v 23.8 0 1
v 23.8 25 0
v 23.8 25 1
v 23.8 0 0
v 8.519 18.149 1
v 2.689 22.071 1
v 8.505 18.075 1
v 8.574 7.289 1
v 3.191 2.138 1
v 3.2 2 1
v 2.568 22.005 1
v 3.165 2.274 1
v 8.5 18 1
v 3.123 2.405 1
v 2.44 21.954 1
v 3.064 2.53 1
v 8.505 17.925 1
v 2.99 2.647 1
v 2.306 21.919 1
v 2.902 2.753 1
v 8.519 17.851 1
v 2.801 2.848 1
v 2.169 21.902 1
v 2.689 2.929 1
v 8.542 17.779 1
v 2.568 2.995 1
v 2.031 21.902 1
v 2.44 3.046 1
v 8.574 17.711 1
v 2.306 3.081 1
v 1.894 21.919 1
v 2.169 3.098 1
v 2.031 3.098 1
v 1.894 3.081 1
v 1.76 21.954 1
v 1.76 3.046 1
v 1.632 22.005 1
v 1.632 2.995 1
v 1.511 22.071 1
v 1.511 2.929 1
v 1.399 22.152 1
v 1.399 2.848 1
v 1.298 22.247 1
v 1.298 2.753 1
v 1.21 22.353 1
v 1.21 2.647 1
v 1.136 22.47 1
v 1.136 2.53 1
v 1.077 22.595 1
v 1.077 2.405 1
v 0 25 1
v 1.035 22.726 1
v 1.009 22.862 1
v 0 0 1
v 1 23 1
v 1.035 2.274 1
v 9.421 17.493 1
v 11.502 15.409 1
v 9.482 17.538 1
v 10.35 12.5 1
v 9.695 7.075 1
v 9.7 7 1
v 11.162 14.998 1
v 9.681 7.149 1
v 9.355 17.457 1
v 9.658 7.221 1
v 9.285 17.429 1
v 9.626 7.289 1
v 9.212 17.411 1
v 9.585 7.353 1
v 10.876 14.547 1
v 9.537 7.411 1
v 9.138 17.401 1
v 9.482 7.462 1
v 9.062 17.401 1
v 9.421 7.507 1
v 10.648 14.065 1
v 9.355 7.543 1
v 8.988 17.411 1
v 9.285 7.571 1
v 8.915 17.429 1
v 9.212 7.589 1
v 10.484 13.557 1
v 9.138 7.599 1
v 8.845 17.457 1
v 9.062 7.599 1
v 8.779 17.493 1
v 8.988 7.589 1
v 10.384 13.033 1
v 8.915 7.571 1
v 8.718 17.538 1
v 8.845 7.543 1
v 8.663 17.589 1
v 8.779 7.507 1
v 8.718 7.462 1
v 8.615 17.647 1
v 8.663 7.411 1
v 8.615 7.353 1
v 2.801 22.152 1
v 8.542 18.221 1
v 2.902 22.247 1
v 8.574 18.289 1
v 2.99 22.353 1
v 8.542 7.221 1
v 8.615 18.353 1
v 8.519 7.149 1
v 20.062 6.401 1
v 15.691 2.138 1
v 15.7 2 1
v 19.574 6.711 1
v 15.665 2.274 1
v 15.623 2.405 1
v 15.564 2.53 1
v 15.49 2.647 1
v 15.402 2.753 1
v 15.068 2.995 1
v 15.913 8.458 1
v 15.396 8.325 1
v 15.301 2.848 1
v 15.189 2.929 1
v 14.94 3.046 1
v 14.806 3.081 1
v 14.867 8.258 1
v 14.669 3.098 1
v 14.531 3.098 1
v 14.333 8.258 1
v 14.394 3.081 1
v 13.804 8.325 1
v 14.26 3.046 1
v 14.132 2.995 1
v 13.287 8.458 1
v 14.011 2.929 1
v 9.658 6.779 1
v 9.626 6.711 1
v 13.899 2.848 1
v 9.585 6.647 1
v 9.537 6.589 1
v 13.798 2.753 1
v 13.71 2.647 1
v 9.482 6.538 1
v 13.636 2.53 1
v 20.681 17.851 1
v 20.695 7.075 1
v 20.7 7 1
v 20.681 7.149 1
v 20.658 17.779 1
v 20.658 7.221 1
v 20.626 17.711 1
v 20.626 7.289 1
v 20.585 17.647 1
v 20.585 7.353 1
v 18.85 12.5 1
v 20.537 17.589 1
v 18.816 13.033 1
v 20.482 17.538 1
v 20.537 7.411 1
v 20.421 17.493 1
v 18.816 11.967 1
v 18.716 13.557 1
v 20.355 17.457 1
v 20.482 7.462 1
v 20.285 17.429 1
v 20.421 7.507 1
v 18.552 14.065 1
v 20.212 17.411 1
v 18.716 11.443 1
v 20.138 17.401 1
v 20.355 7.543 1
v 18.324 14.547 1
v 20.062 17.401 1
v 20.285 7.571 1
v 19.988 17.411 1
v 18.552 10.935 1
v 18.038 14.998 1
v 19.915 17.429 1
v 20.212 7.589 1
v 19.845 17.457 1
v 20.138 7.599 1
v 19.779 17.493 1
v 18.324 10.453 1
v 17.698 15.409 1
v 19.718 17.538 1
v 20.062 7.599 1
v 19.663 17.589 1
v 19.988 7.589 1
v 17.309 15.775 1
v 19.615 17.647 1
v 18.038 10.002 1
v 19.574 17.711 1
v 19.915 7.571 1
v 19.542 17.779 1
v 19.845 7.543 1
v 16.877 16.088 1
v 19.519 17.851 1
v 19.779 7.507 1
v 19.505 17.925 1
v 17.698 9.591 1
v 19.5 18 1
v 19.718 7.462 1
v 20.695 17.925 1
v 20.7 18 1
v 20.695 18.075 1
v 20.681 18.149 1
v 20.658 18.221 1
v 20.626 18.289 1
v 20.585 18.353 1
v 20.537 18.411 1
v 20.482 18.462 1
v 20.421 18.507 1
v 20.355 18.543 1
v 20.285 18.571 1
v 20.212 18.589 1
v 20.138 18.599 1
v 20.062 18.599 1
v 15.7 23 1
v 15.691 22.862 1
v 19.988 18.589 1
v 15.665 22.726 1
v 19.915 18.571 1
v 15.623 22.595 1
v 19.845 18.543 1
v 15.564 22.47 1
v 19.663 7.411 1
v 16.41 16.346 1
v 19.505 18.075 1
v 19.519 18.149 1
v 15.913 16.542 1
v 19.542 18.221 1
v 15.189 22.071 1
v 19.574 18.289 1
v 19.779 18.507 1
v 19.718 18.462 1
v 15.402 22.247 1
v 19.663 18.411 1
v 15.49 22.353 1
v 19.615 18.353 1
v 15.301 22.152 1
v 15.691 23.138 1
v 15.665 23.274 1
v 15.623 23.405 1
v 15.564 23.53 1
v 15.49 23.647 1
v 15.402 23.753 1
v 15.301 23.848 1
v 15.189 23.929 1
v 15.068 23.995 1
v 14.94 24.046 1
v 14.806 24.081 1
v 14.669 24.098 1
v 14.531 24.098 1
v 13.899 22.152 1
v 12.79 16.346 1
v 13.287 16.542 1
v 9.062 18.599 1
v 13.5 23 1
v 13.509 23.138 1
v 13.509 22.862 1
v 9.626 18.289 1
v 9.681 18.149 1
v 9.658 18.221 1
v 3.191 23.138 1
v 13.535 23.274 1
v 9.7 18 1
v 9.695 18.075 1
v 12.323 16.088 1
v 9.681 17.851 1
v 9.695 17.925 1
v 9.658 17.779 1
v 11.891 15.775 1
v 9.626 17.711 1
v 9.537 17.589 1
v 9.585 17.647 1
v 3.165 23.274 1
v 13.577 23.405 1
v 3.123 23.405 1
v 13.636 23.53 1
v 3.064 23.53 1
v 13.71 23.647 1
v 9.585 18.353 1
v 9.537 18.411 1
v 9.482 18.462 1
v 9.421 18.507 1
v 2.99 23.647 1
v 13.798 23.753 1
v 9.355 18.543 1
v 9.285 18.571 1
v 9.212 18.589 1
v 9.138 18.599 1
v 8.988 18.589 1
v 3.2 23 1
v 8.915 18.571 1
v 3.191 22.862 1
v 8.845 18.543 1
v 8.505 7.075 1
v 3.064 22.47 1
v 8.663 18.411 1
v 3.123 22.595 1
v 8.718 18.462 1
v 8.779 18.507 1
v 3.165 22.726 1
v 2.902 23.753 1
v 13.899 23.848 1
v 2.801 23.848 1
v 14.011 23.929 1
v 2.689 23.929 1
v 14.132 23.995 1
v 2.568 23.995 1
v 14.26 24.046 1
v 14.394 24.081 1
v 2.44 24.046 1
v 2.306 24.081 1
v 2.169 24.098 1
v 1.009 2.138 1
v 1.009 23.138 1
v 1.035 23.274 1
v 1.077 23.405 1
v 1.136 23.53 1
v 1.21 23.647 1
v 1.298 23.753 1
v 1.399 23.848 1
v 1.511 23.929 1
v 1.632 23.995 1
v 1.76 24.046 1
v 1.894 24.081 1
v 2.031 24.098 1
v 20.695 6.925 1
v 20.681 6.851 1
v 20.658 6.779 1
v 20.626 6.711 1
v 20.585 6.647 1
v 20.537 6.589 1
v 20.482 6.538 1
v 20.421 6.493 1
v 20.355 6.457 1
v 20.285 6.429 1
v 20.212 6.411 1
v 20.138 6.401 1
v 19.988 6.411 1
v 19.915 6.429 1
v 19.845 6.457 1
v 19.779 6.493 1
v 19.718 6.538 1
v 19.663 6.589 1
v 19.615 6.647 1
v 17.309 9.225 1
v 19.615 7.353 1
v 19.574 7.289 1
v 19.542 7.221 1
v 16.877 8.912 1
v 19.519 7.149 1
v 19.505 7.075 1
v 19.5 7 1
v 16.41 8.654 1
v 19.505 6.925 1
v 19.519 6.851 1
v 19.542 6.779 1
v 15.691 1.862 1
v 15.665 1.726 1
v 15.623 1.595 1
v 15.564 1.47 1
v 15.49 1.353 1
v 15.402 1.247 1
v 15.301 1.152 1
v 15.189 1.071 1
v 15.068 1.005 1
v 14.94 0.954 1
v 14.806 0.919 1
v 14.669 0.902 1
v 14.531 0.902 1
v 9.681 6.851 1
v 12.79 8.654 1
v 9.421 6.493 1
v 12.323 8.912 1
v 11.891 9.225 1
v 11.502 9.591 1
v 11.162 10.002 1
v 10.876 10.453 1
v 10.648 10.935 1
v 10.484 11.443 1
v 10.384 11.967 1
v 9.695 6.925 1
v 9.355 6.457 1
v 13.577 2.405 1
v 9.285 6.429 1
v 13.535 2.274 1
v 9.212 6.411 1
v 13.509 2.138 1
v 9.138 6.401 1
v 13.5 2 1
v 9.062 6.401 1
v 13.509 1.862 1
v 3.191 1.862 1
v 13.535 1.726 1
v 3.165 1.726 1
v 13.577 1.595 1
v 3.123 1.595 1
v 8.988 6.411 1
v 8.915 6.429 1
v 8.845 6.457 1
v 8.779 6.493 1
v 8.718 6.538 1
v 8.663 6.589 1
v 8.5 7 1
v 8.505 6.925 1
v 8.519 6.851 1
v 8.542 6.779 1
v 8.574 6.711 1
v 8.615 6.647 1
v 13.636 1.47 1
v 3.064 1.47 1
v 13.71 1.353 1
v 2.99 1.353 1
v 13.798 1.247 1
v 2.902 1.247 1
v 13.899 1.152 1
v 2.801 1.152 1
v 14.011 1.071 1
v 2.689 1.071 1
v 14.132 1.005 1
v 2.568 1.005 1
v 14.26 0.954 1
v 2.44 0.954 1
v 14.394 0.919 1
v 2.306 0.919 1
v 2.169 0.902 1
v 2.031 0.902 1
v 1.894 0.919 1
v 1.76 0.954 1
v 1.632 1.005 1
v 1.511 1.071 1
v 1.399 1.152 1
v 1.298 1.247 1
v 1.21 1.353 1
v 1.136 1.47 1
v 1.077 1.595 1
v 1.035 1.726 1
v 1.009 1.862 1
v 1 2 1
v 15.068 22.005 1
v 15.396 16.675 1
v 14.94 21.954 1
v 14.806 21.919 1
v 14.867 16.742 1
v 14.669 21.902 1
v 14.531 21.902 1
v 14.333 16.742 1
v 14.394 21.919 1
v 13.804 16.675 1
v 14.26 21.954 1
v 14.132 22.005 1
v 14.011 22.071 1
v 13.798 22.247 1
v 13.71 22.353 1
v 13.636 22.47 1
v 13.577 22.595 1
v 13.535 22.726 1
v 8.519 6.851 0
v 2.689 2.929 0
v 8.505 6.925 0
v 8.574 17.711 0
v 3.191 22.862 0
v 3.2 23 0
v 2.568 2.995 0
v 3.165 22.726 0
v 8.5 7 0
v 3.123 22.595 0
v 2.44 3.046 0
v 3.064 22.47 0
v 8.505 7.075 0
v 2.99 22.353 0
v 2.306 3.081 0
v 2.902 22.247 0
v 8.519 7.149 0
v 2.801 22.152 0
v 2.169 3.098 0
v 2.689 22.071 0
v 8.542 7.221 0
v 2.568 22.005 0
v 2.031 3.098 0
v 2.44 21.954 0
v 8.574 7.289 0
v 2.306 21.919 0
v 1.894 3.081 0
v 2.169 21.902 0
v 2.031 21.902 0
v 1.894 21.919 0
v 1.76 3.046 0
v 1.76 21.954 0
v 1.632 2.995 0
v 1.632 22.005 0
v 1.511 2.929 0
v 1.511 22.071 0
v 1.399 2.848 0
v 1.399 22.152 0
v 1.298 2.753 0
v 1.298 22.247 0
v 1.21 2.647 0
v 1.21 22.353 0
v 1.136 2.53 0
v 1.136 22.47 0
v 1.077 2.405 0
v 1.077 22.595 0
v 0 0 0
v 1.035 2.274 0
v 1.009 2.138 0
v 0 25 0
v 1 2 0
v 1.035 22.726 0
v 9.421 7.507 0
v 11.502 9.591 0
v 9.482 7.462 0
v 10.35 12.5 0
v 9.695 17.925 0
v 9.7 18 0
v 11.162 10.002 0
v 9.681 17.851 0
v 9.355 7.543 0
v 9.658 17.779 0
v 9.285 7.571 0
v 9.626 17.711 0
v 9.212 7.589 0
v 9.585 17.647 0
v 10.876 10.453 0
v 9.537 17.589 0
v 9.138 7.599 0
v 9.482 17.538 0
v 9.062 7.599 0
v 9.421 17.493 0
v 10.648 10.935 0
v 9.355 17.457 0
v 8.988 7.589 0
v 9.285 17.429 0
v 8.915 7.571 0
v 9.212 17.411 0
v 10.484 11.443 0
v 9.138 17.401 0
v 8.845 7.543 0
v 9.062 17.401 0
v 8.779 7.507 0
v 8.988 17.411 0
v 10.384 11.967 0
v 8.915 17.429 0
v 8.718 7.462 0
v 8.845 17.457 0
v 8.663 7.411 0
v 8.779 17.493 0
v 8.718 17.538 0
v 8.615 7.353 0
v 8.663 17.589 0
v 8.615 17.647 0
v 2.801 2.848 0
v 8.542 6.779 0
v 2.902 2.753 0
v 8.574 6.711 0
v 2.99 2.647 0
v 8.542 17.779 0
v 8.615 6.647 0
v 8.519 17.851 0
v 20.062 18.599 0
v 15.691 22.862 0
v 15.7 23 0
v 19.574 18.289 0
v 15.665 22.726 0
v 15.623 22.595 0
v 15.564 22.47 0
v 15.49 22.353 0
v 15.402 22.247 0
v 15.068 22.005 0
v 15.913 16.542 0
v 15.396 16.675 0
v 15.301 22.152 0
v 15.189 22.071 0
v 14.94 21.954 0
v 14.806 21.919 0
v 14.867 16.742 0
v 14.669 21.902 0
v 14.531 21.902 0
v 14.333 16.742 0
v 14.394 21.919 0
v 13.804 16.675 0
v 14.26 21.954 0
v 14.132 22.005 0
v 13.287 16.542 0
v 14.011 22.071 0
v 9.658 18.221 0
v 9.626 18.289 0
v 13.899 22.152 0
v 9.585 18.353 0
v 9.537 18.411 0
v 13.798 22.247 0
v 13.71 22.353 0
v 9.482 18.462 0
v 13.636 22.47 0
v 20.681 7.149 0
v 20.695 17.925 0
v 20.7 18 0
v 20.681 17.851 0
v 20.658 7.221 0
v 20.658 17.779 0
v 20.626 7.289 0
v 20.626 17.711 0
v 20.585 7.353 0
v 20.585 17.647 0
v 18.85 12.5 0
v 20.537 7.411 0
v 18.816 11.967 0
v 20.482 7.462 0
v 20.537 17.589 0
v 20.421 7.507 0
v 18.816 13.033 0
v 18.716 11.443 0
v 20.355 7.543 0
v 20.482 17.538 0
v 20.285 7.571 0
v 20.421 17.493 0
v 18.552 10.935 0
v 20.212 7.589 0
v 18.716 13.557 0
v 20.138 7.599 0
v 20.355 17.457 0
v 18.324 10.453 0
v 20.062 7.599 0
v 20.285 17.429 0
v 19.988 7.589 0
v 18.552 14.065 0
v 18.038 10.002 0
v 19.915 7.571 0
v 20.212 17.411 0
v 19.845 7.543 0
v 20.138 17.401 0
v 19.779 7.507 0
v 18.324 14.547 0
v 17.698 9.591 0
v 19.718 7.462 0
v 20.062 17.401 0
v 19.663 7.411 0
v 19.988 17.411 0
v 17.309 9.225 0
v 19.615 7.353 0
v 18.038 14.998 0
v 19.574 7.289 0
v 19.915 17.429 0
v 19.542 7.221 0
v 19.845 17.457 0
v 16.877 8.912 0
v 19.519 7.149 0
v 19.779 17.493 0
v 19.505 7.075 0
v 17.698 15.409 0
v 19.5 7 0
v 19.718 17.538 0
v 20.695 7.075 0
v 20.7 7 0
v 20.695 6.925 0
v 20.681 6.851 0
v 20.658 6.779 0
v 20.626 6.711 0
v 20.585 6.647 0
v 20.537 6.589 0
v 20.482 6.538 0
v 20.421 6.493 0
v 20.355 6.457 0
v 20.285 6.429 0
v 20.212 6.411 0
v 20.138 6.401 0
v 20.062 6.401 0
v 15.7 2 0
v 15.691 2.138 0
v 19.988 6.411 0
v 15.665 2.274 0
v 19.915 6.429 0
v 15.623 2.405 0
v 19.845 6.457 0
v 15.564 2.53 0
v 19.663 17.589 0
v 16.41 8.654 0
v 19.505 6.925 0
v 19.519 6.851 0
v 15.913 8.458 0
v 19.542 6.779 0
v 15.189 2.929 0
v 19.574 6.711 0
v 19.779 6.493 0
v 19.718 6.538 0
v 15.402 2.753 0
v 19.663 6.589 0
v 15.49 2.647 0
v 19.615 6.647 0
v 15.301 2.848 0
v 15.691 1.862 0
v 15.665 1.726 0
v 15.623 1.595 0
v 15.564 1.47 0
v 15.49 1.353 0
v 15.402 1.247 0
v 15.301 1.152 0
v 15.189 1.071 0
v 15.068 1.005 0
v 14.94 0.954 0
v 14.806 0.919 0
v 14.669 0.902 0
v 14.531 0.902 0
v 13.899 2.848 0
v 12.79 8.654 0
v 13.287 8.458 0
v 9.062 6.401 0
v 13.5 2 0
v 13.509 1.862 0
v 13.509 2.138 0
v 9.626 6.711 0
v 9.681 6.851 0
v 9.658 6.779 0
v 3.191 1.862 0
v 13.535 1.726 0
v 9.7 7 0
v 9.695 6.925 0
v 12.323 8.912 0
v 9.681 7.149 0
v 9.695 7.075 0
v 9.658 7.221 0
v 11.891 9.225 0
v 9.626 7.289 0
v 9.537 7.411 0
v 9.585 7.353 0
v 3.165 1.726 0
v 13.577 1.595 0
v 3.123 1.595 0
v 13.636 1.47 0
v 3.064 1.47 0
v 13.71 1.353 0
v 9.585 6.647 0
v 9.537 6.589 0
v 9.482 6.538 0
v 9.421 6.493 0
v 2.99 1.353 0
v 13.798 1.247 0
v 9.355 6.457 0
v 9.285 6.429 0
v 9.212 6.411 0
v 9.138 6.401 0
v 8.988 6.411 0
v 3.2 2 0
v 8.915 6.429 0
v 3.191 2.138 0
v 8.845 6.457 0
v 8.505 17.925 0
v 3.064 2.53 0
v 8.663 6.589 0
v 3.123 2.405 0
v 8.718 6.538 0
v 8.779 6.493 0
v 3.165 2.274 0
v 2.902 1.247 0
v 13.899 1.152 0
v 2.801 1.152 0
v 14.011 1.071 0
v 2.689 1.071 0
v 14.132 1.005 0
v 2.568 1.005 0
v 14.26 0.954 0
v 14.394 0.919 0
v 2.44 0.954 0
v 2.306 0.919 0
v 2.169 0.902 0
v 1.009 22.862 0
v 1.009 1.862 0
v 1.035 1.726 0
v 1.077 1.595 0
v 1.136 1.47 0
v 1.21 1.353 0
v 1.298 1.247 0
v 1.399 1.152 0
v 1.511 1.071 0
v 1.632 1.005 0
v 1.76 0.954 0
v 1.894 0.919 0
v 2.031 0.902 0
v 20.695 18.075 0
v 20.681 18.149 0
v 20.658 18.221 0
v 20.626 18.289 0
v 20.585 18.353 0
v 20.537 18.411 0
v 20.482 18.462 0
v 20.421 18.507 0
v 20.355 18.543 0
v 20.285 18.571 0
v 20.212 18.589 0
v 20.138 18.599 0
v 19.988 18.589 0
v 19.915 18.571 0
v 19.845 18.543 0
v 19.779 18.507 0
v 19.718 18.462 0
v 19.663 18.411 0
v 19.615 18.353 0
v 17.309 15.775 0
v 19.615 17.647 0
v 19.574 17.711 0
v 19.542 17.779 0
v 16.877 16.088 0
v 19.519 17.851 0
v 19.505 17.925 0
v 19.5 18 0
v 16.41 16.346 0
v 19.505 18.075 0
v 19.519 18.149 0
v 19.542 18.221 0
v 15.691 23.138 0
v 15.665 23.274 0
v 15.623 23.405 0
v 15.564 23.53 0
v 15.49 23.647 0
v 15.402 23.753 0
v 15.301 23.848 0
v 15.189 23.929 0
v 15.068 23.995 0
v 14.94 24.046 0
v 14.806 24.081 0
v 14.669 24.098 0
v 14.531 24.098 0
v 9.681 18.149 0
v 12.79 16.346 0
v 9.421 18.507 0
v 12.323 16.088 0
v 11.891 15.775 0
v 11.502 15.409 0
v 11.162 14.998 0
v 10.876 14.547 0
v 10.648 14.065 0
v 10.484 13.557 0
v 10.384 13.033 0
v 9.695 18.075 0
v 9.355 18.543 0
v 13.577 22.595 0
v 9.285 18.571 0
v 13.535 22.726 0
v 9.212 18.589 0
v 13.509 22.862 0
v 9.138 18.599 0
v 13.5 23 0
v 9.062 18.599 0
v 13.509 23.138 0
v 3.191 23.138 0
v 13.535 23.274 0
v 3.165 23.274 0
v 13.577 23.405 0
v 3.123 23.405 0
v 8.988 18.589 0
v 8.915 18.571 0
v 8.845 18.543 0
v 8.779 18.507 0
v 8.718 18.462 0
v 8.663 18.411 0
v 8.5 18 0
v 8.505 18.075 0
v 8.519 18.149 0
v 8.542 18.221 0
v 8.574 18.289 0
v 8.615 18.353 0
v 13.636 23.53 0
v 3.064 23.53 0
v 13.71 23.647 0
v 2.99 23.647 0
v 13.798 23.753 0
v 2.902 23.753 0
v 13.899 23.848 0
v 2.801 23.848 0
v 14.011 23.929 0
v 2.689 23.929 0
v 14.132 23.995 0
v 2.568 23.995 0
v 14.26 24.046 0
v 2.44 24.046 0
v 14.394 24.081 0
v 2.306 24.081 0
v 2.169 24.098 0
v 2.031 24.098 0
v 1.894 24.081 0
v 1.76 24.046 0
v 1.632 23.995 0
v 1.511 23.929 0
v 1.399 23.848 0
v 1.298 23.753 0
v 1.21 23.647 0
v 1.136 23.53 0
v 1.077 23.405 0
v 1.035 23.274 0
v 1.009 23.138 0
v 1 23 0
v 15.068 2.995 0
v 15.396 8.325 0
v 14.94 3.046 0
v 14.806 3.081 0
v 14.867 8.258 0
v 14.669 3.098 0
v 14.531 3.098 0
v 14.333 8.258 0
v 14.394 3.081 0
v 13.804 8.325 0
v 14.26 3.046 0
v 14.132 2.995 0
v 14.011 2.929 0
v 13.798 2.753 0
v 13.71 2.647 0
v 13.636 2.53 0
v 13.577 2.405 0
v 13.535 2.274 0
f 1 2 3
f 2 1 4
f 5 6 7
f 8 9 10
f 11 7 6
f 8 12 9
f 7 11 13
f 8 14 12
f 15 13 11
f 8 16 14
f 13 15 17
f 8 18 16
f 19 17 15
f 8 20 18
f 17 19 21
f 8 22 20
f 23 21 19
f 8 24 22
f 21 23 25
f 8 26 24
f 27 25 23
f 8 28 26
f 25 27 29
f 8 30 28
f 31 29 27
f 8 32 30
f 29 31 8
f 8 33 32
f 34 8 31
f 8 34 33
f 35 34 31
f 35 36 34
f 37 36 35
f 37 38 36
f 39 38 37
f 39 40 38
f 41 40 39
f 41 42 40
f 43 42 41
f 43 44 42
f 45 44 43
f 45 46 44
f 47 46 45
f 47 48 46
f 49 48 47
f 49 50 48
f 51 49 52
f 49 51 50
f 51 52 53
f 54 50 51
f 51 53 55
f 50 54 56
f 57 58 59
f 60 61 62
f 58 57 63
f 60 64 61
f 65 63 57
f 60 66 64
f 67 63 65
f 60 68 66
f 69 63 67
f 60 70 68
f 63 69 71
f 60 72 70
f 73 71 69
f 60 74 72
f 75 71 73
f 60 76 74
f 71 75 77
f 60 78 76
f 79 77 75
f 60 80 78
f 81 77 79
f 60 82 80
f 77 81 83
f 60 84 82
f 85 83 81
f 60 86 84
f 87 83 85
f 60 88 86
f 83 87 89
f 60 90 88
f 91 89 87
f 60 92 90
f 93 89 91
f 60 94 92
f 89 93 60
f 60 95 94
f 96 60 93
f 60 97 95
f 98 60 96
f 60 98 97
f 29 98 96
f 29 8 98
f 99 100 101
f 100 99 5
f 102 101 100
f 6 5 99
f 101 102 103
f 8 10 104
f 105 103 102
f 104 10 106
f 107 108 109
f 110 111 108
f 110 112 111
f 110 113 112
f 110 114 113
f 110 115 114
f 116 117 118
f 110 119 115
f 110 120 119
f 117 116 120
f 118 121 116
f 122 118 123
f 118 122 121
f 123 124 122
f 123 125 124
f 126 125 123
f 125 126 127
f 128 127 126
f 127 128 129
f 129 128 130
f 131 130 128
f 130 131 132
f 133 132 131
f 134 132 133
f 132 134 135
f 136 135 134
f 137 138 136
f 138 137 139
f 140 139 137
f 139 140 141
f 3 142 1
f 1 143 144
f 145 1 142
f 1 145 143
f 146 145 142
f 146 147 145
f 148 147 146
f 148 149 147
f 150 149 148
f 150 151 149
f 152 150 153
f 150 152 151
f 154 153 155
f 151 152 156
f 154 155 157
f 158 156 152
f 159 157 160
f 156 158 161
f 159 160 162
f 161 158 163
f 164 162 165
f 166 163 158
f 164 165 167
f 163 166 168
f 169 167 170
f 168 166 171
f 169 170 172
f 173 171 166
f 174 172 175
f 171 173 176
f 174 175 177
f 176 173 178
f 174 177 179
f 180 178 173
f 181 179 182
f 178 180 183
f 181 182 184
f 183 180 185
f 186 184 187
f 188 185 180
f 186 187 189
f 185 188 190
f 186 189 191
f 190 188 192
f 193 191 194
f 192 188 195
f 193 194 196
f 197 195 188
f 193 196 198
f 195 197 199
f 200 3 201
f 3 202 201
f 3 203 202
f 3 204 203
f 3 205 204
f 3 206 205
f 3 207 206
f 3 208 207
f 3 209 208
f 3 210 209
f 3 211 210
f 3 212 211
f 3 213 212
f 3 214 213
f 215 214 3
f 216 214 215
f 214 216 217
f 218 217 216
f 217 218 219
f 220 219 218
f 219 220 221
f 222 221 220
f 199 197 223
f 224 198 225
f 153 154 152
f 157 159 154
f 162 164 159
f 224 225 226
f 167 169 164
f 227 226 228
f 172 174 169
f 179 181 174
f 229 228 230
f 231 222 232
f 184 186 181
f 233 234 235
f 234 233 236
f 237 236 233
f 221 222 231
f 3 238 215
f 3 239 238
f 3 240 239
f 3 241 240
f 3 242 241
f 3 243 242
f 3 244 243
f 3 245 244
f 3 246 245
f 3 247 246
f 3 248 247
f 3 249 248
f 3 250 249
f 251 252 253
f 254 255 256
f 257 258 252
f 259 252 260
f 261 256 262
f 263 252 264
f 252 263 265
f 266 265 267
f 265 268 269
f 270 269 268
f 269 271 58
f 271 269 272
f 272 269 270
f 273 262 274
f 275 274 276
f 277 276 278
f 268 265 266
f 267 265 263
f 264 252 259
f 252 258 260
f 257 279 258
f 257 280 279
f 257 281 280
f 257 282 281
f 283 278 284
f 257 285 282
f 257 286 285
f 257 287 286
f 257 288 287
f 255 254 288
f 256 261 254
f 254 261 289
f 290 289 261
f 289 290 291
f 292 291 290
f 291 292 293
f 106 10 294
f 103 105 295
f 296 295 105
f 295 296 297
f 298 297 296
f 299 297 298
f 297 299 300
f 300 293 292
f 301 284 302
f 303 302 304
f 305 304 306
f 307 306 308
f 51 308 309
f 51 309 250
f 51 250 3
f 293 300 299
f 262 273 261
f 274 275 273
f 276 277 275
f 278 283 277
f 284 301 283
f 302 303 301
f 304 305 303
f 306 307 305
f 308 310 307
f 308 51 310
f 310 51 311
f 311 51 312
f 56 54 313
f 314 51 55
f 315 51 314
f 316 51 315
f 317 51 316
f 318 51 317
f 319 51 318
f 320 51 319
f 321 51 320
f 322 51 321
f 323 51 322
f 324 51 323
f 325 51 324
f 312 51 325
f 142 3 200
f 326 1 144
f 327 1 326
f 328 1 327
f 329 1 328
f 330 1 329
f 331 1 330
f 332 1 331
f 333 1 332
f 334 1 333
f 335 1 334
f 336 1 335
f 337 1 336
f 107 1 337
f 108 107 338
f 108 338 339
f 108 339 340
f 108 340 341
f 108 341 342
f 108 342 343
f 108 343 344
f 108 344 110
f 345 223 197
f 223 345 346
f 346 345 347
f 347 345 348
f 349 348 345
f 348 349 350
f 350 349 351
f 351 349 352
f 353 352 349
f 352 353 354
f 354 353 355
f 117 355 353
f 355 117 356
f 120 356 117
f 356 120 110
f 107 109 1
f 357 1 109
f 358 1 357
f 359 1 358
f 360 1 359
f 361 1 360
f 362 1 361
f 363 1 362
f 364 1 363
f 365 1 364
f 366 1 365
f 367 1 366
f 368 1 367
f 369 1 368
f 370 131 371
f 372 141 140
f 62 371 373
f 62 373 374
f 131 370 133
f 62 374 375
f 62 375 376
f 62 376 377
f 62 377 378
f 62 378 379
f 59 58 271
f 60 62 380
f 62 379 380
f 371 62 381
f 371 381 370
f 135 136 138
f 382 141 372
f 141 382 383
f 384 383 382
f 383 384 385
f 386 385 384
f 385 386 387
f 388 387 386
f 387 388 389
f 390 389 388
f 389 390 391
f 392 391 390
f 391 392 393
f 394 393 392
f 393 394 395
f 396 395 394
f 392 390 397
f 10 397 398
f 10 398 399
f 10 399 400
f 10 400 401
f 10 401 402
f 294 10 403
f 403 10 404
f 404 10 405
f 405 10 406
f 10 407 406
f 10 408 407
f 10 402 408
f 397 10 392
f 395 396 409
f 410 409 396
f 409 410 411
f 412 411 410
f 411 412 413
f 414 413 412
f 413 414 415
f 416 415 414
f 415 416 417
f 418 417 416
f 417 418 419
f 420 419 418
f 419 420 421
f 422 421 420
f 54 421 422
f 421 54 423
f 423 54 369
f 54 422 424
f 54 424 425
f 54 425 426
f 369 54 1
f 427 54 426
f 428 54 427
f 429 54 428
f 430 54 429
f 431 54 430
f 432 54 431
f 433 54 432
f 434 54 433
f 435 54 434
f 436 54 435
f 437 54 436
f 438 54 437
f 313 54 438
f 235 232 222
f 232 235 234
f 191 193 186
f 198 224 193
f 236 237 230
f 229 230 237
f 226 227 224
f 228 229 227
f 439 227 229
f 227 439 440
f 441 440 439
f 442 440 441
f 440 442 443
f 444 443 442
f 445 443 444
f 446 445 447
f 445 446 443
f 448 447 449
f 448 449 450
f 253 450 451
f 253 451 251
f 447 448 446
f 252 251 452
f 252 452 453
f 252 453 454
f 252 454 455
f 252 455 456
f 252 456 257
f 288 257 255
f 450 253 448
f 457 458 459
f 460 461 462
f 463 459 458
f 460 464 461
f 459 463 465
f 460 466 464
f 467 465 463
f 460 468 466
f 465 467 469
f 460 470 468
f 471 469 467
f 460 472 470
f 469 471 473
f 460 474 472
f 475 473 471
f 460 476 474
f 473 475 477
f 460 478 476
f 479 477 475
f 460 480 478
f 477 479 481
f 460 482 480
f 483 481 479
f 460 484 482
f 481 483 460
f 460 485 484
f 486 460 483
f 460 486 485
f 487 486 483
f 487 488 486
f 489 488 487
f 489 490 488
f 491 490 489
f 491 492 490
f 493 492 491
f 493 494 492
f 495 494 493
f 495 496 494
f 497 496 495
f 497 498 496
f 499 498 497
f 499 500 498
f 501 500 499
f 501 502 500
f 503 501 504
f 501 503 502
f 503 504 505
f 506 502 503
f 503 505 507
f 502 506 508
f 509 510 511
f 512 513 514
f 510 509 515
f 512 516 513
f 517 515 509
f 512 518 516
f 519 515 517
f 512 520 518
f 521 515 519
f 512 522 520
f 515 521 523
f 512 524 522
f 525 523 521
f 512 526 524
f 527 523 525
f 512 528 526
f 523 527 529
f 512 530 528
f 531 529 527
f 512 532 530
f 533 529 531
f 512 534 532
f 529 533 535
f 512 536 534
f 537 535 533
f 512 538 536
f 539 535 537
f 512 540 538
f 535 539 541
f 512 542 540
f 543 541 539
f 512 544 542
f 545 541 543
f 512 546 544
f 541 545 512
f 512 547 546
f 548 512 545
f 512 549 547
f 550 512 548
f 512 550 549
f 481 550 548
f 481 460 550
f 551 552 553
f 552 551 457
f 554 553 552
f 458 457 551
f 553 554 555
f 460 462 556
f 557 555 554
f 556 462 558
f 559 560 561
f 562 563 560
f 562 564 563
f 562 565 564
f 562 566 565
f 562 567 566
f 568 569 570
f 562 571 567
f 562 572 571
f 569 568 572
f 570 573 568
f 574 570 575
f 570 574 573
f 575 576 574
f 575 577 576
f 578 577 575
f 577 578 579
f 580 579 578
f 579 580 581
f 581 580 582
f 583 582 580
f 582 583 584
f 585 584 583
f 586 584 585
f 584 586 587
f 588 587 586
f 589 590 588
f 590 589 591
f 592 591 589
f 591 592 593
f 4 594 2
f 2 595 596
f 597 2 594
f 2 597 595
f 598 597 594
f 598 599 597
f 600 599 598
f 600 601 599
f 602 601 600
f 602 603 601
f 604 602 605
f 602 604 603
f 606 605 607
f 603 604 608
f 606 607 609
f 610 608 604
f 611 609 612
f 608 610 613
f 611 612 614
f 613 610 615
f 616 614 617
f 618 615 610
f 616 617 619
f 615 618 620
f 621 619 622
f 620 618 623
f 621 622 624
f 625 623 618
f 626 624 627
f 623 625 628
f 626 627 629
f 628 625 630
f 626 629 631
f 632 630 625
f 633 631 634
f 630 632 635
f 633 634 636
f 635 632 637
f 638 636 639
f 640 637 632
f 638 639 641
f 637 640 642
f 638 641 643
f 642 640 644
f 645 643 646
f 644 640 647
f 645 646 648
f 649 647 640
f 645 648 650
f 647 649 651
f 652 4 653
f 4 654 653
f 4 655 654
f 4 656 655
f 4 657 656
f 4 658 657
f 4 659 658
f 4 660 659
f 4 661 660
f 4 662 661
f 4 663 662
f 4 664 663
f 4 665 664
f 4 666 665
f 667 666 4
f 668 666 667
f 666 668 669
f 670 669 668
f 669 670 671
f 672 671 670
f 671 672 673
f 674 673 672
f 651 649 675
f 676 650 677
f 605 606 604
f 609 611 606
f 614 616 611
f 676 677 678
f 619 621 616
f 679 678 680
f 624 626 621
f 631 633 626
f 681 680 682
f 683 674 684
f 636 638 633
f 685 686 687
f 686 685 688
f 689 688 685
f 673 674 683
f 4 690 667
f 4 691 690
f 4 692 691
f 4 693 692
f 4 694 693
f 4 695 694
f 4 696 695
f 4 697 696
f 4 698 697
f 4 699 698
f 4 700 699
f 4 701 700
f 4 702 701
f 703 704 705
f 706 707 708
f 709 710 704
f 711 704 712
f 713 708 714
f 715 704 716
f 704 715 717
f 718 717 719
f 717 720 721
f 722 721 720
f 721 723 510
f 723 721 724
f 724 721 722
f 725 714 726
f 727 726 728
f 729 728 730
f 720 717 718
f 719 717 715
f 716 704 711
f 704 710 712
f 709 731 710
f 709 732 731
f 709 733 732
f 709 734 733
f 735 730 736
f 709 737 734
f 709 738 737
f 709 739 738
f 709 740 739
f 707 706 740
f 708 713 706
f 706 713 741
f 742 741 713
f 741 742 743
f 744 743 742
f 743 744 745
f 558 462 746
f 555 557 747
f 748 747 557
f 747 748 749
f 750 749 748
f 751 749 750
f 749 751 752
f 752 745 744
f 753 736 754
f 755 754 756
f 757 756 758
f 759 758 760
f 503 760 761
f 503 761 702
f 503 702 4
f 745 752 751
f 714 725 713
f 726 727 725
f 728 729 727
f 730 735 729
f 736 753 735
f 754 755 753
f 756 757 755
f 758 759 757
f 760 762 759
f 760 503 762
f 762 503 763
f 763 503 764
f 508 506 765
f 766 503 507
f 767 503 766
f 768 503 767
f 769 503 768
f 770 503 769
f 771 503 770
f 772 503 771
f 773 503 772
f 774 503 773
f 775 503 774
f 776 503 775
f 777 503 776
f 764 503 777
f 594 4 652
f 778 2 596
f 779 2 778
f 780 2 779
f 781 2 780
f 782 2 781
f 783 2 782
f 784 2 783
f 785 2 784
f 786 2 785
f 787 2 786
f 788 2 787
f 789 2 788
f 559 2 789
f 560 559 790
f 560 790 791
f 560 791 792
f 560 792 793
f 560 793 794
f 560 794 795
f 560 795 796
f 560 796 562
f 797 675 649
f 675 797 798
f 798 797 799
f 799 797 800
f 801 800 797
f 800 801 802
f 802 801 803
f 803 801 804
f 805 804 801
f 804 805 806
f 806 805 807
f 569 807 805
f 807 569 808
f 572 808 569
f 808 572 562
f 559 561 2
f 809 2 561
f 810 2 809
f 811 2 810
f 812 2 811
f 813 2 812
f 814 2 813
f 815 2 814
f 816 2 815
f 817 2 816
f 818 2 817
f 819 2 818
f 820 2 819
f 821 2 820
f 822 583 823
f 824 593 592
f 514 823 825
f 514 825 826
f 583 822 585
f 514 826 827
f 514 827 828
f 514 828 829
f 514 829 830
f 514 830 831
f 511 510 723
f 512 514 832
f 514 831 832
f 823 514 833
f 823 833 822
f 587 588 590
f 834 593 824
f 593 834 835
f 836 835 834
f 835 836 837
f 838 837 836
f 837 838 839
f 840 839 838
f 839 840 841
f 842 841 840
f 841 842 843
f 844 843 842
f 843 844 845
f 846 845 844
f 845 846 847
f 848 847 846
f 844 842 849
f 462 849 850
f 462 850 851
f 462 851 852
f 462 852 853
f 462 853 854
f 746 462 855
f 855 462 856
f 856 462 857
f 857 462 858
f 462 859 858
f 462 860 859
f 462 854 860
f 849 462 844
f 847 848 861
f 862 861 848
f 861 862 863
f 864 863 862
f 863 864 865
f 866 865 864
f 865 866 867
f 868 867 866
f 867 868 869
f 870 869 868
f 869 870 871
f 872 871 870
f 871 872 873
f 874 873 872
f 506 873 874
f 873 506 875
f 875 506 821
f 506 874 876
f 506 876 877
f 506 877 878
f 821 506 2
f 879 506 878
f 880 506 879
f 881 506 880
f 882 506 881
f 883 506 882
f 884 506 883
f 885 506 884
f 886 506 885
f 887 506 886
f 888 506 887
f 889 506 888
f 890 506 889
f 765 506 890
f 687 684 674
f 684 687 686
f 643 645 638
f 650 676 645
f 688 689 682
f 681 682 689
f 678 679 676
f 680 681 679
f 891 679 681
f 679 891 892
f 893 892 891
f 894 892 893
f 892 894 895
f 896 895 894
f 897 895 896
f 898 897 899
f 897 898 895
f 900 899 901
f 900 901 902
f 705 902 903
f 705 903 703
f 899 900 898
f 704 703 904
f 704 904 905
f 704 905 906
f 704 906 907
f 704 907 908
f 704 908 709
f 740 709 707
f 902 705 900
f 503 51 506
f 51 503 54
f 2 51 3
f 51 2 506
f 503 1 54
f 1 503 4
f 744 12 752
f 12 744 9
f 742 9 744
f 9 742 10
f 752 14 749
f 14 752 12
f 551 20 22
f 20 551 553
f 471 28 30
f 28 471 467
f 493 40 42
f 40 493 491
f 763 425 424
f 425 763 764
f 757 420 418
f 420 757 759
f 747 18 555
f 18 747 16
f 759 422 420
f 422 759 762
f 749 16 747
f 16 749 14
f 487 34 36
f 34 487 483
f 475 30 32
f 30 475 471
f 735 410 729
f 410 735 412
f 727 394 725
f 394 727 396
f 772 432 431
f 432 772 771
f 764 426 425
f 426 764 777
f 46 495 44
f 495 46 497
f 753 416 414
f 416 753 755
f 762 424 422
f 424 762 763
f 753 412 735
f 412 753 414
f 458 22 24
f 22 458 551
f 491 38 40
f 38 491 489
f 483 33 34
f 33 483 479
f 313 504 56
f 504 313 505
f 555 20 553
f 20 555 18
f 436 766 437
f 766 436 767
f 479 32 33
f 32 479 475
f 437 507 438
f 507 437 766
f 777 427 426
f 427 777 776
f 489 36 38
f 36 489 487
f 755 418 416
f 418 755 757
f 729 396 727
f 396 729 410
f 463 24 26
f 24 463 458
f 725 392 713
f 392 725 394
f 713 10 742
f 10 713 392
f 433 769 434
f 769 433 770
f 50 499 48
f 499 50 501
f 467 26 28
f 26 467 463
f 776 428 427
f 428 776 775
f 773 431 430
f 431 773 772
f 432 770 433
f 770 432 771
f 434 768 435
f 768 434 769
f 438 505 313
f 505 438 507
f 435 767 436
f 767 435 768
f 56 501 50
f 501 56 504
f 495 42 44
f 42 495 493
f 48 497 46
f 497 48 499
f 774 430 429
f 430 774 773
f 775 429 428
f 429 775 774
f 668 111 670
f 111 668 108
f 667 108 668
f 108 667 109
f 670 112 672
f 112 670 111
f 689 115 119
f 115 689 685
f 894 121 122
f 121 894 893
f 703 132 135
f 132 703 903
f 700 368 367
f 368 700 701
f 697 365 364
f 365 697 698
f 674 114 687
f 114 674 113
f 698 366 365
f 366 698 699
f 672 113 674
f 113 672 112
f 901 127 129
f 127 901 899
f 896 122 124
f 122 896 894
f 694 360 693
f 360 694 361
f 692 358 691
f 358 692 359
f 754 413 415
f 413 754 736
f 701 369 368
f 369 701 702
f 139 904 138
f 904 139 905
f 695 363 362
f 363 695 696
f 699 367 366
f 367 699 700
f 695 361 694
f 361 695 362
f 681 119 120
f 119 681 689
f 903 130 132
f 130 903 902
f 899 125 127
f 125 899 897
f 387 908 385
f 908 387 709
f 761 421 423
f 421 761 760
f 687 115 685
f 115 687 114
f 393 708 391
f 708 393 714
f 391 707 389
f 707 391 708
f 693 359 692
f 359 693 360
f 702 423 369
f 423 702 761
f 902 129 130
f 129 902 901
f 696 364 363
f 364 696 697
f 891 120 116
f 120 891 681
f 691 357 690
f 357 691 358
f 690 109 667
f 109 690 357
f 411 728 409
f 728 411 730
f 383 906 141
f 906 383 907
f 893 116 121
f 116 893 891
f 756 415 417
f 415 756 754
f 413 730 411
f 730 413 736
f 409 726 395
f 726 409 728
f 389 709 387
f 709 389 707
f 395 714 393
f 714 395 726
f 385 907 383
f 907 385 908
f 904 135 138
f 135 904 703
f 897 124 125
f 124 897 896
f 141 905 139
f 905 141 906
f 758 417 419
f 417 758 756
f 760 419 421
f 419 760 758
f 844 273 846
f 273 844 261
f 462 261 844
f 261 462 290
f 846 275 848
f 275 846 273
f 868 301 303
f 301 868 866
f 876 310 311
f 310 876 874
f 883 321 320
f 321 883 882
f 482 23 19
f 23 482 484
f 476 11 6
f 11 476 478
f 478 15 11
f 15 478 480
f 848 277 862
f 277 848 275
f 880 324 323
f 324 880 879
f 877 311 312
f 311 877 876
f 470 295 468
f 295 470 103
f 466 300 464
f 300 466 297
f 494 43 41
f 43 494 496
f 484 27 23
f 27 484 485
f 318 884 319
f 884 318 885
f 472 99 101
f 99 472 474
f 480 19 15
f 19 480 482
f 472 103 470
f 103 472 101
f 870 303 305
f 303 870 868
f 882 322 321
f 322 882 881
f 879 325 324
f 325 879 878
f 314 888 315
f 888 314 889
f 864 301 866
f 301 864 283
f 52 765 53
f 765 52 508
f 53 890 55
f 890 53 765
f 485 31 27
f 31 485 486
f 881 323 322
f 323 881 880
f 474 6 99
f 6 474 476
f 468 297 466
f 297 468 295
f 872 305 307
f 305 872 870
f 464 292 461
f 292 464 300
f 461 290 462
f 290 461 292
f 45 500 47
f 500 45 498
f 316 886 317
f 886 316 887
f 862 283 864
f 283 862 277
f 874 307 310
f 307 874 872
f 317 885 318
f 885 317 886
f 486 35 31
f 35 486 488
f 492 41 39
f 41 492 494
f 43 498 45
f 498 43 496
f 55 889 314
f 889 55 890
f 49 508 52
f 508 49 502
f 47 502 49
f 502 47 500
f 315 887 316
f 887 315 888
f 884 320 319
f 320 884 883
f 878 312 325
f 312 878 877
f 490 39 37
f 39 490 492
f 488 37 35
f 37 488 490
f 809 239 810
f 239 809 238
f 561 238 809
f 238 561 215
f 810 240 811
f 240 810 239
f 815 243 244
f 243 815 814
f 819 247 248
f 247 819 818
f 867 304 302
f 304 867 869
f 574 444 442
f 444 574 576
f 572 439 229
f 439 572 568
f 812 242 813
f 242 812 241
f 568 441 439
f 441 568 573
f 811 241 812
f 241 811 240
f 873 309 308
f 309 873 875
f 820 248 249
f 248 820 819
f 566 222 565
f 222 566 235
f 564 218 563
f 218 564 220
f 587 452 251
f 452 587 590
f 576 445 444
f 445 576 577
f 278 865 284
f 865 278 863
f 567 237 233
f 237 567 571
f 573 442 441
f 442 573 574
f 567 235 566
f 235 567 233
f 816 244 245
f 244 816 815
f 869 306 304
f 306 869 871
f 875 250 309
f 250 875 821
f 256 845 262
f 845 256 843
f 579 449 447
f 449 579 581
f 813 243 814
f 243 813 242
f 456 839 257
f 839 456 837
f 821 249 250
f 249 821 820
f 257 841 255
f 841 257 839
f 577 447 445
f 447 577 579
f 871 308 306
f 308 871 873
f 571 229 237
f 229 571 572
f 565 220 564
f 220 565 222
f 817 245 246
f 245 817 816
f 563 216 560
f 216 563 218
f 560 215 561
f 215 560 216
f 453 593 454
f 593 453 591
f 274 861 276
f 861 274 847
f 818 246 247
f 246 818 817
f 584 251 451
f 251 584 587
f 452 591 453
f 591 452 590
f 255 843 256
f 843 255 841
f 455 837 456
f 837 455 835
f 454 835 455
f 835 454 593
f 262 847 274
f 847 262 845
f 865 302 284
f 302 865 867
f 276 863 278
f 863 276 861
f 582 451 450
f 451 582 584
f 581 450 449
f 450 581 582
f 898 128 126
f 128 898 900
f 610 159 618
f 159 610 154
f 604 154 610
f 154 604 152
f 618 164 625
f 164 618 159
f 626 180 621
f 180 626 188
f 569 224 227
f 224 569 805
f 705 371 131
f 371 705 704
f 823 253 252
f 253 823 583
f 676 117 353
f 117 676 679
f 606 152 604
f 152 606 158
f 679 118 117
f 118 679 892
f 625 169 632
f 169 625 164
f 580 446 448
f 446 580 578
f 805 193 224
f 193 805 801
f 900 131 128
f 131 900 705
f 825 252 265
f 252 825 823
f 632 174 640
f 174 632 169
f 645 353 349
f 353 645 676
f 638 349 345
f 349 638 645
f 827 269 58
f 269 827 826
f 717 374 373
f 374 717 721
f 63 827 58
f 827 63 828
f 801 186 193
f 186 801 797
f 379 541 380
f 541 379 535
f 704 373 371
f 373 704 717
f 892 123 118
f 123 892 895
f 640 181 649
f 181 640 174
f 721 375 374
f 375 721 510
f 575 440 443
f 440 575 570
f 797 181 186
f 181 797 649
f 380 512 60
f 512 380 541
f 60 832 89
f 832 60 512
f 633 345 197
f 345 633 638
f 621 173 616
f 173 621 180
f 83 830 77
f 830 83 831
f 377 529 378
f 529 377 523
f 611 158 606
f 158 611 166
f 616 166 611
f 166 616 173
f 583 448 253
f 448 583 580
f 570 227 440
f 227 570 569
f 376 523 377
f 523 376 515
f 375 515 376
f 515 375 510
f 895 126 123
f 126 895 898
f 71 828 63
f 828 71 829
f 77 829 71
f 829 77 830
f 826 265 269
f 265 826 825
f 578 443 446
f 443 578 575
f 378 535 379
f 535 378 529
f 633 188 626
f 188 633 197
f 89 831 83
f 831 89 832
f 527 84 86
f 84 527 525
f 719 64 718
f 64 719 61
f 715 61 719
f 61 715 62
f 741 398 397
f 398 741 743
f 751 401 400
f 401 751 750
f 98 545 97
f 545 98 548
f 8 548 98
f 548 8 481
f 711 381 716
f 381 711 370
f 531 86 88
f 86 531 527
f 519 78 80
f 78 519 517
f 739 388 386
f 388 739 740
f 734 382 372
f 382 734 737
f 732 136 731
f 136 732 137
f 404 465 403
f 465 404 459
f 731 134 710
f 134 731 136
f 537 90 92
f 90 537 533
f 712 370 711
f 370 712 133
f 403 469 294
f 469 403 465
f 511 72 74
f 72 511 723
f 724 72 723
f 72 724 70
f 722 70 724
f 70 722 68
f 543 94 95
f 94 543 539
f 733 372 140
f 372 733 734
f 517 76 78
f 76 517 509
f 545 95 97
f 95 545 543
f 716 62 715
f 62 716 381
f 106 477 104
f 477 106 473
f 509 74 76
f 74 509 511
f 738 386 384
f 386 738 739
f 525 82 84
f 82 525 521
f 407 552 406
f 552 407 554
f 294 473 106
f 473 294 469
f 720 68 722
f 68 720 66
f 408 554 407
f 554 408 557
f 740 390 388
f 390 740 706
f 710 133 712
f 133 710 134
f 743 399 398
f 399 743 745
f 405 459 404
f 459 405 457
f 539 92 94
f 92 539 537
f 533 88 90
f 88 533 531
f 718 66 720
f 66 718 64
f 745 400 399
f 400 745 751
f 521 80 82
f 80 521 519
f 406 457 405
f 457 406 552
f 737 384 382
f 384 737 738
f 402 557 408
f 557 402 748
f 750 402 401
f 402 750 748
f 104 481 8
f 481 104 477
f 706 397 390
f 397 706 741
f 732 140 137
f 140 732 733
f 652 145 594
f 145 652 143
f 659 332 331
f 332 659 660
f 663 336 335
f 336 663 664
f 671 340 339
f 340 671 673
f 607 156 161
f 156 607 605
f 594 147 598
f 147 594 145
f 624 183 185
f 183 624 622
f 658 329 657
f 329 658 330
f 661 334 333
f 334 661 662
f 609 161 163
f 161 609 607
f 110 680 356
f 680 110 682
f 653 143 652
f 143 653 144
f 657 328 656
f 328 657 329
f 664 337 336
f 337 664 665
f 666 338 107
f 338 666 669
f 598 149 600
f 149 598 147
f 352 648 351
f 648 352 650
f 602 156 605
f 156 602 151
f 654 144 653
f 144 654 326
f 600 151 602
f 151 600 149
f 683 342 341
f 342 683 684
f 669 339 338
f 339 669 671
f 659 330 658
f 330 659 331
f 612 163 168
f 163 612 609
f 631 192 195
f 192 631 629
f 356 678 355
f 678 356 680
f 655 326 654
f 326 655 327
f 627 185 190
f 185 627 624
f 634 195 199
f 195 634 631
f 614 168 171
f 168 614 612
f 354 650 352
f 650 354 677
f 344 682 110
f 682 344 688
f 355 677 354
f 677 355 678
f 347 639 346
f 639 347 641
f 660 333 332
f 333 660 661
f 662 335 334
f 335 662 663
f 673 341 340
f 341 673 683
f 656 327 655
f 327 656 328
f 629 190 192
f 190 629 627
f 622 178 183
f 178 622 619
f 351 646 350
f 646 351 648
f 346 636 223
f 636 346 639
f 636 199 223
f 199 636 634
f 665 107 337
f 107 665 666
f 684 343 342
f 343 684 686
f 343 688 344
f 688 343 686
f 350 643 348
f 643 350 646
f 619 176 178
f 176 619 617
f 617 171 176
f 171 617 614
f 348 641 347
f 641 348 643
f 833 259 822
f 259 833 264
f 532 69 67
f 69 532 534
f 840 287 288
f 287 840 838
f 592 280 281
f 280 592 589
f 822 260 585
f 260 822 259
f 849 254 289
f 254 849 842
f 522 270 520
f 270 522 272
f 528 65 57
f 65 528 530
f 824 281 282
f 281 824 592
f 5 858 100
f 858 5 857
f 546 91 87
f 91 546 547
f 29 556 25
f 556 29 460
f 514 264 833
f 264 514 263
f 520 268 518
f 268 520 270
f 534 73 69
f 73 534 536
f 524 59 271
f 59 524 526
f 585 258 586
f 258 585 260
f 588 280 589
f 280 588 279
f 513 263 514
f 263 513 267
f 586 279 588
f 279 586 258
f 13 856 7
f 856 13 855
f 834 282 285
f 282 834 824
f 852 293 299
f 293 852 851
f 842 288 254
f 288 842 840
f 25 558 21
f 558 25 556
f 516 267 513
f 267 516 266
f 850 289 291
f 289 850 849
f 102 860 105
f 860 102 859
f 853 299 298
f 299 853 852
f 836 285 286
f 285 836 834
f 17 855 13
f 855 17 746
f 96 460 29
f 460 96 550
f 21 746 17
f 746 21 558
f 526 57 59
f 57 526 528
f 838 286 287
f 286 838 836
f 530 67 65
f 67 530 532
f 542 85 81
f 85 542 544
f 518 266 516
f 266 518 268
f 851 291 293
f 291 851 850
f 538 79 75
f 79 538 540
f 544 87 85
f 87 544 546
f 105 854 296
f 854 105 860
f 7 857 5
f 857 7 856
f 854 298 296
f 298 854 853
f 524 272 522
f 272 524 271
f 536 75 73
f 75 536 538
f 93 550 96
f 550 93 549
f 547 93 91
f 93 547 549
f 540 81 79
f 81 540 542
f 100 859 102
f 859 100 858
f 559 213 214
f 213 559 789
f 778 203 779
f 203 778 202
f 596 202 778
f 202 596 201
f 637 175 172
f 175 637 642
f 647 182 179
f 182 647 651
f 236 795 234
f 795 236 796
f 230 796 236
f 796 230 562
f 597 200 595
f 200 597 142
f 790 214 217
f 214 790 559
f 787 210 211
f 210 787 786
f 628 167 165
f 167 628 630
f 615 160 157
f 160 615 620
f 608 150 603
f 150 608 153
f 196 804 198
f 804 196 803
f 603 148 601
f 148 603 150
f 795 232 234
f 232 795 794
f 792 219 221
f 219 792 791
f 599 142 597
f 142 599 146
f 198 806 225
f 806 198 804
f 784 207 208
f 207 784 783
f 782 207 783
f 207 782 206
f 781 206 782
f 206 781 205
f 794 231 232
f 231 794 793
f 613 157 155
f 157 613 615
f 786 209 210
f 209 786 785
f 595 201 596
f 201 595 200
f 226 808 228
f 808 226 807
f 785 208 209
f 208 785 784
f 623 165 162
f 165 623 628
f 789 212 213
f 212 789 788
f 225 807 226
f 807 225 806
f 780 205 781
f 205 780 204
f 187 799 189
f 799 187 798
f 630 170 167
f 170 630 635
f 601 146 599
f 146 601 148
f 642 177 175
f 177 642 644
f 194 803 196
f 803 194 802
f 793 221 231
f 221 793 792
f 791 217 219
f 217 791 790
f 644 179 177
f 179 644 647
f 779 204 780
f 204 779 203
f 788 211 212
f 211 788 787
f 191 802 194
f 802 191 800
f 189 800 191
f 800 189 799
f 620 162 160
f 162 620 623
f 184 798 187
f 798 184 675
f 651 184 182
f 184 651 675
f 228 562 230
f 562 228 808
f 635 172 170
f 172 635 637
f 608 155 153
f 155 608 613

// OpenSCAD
// Boormal Pi Zero Cam3 casing mod

base_x=23.8;
base_y=25.0;
thick=1;

mount_dist_x=12.5;
mount_dist_y=21.0;
mount_d=2.2;
mount_off_x=1+mount_d/2;
mount_off_y=(base_y-mount_dist_y)/2;

cam_off_x=mount_off_x+mount_dist_x;
cam_off_y=base_y/2;
cam_lens_d=8.5;      // cam hole diameter including spacing
cam_hous_w=11.0;
cam_hous_w2=cam_hous_w/2;


$fn=50;

difference() {
    cube([base_x, base_y, thick]);

    translate([mount_off_x,mount_off_y,-0.01])
      cylinder(h=thick+0.02, d=mount_d);
    translate([mount_off_x+mount_dist_x,mount_off_y,-0.01])
      cylinder(h=thick+0.02, d=mount_d);

    translate([mount_off_x,mount_off_y+mount_dist_y,-0.01])
      cylinder(h=thick+0.02, d=mount_d);
    translate([mount_off_x+mount_dist_x,mount_off_y+mount_dist_y,-0.01])
      cylinder(h=thick+0.02, d=mount_d);
    
    translate([cam_off_x,cam_off_y,-0.01])
      cylinder(h=thick+0.02, d=cam_lens_d);

    translate([cam_off_x-cam_hous_w2,cam_off_y-cam_hous_w2,-0.01])
      cylinder(h=thick+0.02, d=1.2);
    translate([cam_off_x+cam_hous_w2,cam_off_y-cam_hous_w2,-0.01])
      cylinder(h=thick+0.02, d=1.2);
    translate([cam_off_x-cam_hous_w2,cam_off_y+cam_hous_w2,-0.01])
      cylinder(h=thick+0.02, d=1.2);
    translate([cam_off_x+cam_hous_w2,cam_off_y+cam_hous_w2,-0.01])
      cylinder(h=thick+0.02, d=1.2);
    
}
